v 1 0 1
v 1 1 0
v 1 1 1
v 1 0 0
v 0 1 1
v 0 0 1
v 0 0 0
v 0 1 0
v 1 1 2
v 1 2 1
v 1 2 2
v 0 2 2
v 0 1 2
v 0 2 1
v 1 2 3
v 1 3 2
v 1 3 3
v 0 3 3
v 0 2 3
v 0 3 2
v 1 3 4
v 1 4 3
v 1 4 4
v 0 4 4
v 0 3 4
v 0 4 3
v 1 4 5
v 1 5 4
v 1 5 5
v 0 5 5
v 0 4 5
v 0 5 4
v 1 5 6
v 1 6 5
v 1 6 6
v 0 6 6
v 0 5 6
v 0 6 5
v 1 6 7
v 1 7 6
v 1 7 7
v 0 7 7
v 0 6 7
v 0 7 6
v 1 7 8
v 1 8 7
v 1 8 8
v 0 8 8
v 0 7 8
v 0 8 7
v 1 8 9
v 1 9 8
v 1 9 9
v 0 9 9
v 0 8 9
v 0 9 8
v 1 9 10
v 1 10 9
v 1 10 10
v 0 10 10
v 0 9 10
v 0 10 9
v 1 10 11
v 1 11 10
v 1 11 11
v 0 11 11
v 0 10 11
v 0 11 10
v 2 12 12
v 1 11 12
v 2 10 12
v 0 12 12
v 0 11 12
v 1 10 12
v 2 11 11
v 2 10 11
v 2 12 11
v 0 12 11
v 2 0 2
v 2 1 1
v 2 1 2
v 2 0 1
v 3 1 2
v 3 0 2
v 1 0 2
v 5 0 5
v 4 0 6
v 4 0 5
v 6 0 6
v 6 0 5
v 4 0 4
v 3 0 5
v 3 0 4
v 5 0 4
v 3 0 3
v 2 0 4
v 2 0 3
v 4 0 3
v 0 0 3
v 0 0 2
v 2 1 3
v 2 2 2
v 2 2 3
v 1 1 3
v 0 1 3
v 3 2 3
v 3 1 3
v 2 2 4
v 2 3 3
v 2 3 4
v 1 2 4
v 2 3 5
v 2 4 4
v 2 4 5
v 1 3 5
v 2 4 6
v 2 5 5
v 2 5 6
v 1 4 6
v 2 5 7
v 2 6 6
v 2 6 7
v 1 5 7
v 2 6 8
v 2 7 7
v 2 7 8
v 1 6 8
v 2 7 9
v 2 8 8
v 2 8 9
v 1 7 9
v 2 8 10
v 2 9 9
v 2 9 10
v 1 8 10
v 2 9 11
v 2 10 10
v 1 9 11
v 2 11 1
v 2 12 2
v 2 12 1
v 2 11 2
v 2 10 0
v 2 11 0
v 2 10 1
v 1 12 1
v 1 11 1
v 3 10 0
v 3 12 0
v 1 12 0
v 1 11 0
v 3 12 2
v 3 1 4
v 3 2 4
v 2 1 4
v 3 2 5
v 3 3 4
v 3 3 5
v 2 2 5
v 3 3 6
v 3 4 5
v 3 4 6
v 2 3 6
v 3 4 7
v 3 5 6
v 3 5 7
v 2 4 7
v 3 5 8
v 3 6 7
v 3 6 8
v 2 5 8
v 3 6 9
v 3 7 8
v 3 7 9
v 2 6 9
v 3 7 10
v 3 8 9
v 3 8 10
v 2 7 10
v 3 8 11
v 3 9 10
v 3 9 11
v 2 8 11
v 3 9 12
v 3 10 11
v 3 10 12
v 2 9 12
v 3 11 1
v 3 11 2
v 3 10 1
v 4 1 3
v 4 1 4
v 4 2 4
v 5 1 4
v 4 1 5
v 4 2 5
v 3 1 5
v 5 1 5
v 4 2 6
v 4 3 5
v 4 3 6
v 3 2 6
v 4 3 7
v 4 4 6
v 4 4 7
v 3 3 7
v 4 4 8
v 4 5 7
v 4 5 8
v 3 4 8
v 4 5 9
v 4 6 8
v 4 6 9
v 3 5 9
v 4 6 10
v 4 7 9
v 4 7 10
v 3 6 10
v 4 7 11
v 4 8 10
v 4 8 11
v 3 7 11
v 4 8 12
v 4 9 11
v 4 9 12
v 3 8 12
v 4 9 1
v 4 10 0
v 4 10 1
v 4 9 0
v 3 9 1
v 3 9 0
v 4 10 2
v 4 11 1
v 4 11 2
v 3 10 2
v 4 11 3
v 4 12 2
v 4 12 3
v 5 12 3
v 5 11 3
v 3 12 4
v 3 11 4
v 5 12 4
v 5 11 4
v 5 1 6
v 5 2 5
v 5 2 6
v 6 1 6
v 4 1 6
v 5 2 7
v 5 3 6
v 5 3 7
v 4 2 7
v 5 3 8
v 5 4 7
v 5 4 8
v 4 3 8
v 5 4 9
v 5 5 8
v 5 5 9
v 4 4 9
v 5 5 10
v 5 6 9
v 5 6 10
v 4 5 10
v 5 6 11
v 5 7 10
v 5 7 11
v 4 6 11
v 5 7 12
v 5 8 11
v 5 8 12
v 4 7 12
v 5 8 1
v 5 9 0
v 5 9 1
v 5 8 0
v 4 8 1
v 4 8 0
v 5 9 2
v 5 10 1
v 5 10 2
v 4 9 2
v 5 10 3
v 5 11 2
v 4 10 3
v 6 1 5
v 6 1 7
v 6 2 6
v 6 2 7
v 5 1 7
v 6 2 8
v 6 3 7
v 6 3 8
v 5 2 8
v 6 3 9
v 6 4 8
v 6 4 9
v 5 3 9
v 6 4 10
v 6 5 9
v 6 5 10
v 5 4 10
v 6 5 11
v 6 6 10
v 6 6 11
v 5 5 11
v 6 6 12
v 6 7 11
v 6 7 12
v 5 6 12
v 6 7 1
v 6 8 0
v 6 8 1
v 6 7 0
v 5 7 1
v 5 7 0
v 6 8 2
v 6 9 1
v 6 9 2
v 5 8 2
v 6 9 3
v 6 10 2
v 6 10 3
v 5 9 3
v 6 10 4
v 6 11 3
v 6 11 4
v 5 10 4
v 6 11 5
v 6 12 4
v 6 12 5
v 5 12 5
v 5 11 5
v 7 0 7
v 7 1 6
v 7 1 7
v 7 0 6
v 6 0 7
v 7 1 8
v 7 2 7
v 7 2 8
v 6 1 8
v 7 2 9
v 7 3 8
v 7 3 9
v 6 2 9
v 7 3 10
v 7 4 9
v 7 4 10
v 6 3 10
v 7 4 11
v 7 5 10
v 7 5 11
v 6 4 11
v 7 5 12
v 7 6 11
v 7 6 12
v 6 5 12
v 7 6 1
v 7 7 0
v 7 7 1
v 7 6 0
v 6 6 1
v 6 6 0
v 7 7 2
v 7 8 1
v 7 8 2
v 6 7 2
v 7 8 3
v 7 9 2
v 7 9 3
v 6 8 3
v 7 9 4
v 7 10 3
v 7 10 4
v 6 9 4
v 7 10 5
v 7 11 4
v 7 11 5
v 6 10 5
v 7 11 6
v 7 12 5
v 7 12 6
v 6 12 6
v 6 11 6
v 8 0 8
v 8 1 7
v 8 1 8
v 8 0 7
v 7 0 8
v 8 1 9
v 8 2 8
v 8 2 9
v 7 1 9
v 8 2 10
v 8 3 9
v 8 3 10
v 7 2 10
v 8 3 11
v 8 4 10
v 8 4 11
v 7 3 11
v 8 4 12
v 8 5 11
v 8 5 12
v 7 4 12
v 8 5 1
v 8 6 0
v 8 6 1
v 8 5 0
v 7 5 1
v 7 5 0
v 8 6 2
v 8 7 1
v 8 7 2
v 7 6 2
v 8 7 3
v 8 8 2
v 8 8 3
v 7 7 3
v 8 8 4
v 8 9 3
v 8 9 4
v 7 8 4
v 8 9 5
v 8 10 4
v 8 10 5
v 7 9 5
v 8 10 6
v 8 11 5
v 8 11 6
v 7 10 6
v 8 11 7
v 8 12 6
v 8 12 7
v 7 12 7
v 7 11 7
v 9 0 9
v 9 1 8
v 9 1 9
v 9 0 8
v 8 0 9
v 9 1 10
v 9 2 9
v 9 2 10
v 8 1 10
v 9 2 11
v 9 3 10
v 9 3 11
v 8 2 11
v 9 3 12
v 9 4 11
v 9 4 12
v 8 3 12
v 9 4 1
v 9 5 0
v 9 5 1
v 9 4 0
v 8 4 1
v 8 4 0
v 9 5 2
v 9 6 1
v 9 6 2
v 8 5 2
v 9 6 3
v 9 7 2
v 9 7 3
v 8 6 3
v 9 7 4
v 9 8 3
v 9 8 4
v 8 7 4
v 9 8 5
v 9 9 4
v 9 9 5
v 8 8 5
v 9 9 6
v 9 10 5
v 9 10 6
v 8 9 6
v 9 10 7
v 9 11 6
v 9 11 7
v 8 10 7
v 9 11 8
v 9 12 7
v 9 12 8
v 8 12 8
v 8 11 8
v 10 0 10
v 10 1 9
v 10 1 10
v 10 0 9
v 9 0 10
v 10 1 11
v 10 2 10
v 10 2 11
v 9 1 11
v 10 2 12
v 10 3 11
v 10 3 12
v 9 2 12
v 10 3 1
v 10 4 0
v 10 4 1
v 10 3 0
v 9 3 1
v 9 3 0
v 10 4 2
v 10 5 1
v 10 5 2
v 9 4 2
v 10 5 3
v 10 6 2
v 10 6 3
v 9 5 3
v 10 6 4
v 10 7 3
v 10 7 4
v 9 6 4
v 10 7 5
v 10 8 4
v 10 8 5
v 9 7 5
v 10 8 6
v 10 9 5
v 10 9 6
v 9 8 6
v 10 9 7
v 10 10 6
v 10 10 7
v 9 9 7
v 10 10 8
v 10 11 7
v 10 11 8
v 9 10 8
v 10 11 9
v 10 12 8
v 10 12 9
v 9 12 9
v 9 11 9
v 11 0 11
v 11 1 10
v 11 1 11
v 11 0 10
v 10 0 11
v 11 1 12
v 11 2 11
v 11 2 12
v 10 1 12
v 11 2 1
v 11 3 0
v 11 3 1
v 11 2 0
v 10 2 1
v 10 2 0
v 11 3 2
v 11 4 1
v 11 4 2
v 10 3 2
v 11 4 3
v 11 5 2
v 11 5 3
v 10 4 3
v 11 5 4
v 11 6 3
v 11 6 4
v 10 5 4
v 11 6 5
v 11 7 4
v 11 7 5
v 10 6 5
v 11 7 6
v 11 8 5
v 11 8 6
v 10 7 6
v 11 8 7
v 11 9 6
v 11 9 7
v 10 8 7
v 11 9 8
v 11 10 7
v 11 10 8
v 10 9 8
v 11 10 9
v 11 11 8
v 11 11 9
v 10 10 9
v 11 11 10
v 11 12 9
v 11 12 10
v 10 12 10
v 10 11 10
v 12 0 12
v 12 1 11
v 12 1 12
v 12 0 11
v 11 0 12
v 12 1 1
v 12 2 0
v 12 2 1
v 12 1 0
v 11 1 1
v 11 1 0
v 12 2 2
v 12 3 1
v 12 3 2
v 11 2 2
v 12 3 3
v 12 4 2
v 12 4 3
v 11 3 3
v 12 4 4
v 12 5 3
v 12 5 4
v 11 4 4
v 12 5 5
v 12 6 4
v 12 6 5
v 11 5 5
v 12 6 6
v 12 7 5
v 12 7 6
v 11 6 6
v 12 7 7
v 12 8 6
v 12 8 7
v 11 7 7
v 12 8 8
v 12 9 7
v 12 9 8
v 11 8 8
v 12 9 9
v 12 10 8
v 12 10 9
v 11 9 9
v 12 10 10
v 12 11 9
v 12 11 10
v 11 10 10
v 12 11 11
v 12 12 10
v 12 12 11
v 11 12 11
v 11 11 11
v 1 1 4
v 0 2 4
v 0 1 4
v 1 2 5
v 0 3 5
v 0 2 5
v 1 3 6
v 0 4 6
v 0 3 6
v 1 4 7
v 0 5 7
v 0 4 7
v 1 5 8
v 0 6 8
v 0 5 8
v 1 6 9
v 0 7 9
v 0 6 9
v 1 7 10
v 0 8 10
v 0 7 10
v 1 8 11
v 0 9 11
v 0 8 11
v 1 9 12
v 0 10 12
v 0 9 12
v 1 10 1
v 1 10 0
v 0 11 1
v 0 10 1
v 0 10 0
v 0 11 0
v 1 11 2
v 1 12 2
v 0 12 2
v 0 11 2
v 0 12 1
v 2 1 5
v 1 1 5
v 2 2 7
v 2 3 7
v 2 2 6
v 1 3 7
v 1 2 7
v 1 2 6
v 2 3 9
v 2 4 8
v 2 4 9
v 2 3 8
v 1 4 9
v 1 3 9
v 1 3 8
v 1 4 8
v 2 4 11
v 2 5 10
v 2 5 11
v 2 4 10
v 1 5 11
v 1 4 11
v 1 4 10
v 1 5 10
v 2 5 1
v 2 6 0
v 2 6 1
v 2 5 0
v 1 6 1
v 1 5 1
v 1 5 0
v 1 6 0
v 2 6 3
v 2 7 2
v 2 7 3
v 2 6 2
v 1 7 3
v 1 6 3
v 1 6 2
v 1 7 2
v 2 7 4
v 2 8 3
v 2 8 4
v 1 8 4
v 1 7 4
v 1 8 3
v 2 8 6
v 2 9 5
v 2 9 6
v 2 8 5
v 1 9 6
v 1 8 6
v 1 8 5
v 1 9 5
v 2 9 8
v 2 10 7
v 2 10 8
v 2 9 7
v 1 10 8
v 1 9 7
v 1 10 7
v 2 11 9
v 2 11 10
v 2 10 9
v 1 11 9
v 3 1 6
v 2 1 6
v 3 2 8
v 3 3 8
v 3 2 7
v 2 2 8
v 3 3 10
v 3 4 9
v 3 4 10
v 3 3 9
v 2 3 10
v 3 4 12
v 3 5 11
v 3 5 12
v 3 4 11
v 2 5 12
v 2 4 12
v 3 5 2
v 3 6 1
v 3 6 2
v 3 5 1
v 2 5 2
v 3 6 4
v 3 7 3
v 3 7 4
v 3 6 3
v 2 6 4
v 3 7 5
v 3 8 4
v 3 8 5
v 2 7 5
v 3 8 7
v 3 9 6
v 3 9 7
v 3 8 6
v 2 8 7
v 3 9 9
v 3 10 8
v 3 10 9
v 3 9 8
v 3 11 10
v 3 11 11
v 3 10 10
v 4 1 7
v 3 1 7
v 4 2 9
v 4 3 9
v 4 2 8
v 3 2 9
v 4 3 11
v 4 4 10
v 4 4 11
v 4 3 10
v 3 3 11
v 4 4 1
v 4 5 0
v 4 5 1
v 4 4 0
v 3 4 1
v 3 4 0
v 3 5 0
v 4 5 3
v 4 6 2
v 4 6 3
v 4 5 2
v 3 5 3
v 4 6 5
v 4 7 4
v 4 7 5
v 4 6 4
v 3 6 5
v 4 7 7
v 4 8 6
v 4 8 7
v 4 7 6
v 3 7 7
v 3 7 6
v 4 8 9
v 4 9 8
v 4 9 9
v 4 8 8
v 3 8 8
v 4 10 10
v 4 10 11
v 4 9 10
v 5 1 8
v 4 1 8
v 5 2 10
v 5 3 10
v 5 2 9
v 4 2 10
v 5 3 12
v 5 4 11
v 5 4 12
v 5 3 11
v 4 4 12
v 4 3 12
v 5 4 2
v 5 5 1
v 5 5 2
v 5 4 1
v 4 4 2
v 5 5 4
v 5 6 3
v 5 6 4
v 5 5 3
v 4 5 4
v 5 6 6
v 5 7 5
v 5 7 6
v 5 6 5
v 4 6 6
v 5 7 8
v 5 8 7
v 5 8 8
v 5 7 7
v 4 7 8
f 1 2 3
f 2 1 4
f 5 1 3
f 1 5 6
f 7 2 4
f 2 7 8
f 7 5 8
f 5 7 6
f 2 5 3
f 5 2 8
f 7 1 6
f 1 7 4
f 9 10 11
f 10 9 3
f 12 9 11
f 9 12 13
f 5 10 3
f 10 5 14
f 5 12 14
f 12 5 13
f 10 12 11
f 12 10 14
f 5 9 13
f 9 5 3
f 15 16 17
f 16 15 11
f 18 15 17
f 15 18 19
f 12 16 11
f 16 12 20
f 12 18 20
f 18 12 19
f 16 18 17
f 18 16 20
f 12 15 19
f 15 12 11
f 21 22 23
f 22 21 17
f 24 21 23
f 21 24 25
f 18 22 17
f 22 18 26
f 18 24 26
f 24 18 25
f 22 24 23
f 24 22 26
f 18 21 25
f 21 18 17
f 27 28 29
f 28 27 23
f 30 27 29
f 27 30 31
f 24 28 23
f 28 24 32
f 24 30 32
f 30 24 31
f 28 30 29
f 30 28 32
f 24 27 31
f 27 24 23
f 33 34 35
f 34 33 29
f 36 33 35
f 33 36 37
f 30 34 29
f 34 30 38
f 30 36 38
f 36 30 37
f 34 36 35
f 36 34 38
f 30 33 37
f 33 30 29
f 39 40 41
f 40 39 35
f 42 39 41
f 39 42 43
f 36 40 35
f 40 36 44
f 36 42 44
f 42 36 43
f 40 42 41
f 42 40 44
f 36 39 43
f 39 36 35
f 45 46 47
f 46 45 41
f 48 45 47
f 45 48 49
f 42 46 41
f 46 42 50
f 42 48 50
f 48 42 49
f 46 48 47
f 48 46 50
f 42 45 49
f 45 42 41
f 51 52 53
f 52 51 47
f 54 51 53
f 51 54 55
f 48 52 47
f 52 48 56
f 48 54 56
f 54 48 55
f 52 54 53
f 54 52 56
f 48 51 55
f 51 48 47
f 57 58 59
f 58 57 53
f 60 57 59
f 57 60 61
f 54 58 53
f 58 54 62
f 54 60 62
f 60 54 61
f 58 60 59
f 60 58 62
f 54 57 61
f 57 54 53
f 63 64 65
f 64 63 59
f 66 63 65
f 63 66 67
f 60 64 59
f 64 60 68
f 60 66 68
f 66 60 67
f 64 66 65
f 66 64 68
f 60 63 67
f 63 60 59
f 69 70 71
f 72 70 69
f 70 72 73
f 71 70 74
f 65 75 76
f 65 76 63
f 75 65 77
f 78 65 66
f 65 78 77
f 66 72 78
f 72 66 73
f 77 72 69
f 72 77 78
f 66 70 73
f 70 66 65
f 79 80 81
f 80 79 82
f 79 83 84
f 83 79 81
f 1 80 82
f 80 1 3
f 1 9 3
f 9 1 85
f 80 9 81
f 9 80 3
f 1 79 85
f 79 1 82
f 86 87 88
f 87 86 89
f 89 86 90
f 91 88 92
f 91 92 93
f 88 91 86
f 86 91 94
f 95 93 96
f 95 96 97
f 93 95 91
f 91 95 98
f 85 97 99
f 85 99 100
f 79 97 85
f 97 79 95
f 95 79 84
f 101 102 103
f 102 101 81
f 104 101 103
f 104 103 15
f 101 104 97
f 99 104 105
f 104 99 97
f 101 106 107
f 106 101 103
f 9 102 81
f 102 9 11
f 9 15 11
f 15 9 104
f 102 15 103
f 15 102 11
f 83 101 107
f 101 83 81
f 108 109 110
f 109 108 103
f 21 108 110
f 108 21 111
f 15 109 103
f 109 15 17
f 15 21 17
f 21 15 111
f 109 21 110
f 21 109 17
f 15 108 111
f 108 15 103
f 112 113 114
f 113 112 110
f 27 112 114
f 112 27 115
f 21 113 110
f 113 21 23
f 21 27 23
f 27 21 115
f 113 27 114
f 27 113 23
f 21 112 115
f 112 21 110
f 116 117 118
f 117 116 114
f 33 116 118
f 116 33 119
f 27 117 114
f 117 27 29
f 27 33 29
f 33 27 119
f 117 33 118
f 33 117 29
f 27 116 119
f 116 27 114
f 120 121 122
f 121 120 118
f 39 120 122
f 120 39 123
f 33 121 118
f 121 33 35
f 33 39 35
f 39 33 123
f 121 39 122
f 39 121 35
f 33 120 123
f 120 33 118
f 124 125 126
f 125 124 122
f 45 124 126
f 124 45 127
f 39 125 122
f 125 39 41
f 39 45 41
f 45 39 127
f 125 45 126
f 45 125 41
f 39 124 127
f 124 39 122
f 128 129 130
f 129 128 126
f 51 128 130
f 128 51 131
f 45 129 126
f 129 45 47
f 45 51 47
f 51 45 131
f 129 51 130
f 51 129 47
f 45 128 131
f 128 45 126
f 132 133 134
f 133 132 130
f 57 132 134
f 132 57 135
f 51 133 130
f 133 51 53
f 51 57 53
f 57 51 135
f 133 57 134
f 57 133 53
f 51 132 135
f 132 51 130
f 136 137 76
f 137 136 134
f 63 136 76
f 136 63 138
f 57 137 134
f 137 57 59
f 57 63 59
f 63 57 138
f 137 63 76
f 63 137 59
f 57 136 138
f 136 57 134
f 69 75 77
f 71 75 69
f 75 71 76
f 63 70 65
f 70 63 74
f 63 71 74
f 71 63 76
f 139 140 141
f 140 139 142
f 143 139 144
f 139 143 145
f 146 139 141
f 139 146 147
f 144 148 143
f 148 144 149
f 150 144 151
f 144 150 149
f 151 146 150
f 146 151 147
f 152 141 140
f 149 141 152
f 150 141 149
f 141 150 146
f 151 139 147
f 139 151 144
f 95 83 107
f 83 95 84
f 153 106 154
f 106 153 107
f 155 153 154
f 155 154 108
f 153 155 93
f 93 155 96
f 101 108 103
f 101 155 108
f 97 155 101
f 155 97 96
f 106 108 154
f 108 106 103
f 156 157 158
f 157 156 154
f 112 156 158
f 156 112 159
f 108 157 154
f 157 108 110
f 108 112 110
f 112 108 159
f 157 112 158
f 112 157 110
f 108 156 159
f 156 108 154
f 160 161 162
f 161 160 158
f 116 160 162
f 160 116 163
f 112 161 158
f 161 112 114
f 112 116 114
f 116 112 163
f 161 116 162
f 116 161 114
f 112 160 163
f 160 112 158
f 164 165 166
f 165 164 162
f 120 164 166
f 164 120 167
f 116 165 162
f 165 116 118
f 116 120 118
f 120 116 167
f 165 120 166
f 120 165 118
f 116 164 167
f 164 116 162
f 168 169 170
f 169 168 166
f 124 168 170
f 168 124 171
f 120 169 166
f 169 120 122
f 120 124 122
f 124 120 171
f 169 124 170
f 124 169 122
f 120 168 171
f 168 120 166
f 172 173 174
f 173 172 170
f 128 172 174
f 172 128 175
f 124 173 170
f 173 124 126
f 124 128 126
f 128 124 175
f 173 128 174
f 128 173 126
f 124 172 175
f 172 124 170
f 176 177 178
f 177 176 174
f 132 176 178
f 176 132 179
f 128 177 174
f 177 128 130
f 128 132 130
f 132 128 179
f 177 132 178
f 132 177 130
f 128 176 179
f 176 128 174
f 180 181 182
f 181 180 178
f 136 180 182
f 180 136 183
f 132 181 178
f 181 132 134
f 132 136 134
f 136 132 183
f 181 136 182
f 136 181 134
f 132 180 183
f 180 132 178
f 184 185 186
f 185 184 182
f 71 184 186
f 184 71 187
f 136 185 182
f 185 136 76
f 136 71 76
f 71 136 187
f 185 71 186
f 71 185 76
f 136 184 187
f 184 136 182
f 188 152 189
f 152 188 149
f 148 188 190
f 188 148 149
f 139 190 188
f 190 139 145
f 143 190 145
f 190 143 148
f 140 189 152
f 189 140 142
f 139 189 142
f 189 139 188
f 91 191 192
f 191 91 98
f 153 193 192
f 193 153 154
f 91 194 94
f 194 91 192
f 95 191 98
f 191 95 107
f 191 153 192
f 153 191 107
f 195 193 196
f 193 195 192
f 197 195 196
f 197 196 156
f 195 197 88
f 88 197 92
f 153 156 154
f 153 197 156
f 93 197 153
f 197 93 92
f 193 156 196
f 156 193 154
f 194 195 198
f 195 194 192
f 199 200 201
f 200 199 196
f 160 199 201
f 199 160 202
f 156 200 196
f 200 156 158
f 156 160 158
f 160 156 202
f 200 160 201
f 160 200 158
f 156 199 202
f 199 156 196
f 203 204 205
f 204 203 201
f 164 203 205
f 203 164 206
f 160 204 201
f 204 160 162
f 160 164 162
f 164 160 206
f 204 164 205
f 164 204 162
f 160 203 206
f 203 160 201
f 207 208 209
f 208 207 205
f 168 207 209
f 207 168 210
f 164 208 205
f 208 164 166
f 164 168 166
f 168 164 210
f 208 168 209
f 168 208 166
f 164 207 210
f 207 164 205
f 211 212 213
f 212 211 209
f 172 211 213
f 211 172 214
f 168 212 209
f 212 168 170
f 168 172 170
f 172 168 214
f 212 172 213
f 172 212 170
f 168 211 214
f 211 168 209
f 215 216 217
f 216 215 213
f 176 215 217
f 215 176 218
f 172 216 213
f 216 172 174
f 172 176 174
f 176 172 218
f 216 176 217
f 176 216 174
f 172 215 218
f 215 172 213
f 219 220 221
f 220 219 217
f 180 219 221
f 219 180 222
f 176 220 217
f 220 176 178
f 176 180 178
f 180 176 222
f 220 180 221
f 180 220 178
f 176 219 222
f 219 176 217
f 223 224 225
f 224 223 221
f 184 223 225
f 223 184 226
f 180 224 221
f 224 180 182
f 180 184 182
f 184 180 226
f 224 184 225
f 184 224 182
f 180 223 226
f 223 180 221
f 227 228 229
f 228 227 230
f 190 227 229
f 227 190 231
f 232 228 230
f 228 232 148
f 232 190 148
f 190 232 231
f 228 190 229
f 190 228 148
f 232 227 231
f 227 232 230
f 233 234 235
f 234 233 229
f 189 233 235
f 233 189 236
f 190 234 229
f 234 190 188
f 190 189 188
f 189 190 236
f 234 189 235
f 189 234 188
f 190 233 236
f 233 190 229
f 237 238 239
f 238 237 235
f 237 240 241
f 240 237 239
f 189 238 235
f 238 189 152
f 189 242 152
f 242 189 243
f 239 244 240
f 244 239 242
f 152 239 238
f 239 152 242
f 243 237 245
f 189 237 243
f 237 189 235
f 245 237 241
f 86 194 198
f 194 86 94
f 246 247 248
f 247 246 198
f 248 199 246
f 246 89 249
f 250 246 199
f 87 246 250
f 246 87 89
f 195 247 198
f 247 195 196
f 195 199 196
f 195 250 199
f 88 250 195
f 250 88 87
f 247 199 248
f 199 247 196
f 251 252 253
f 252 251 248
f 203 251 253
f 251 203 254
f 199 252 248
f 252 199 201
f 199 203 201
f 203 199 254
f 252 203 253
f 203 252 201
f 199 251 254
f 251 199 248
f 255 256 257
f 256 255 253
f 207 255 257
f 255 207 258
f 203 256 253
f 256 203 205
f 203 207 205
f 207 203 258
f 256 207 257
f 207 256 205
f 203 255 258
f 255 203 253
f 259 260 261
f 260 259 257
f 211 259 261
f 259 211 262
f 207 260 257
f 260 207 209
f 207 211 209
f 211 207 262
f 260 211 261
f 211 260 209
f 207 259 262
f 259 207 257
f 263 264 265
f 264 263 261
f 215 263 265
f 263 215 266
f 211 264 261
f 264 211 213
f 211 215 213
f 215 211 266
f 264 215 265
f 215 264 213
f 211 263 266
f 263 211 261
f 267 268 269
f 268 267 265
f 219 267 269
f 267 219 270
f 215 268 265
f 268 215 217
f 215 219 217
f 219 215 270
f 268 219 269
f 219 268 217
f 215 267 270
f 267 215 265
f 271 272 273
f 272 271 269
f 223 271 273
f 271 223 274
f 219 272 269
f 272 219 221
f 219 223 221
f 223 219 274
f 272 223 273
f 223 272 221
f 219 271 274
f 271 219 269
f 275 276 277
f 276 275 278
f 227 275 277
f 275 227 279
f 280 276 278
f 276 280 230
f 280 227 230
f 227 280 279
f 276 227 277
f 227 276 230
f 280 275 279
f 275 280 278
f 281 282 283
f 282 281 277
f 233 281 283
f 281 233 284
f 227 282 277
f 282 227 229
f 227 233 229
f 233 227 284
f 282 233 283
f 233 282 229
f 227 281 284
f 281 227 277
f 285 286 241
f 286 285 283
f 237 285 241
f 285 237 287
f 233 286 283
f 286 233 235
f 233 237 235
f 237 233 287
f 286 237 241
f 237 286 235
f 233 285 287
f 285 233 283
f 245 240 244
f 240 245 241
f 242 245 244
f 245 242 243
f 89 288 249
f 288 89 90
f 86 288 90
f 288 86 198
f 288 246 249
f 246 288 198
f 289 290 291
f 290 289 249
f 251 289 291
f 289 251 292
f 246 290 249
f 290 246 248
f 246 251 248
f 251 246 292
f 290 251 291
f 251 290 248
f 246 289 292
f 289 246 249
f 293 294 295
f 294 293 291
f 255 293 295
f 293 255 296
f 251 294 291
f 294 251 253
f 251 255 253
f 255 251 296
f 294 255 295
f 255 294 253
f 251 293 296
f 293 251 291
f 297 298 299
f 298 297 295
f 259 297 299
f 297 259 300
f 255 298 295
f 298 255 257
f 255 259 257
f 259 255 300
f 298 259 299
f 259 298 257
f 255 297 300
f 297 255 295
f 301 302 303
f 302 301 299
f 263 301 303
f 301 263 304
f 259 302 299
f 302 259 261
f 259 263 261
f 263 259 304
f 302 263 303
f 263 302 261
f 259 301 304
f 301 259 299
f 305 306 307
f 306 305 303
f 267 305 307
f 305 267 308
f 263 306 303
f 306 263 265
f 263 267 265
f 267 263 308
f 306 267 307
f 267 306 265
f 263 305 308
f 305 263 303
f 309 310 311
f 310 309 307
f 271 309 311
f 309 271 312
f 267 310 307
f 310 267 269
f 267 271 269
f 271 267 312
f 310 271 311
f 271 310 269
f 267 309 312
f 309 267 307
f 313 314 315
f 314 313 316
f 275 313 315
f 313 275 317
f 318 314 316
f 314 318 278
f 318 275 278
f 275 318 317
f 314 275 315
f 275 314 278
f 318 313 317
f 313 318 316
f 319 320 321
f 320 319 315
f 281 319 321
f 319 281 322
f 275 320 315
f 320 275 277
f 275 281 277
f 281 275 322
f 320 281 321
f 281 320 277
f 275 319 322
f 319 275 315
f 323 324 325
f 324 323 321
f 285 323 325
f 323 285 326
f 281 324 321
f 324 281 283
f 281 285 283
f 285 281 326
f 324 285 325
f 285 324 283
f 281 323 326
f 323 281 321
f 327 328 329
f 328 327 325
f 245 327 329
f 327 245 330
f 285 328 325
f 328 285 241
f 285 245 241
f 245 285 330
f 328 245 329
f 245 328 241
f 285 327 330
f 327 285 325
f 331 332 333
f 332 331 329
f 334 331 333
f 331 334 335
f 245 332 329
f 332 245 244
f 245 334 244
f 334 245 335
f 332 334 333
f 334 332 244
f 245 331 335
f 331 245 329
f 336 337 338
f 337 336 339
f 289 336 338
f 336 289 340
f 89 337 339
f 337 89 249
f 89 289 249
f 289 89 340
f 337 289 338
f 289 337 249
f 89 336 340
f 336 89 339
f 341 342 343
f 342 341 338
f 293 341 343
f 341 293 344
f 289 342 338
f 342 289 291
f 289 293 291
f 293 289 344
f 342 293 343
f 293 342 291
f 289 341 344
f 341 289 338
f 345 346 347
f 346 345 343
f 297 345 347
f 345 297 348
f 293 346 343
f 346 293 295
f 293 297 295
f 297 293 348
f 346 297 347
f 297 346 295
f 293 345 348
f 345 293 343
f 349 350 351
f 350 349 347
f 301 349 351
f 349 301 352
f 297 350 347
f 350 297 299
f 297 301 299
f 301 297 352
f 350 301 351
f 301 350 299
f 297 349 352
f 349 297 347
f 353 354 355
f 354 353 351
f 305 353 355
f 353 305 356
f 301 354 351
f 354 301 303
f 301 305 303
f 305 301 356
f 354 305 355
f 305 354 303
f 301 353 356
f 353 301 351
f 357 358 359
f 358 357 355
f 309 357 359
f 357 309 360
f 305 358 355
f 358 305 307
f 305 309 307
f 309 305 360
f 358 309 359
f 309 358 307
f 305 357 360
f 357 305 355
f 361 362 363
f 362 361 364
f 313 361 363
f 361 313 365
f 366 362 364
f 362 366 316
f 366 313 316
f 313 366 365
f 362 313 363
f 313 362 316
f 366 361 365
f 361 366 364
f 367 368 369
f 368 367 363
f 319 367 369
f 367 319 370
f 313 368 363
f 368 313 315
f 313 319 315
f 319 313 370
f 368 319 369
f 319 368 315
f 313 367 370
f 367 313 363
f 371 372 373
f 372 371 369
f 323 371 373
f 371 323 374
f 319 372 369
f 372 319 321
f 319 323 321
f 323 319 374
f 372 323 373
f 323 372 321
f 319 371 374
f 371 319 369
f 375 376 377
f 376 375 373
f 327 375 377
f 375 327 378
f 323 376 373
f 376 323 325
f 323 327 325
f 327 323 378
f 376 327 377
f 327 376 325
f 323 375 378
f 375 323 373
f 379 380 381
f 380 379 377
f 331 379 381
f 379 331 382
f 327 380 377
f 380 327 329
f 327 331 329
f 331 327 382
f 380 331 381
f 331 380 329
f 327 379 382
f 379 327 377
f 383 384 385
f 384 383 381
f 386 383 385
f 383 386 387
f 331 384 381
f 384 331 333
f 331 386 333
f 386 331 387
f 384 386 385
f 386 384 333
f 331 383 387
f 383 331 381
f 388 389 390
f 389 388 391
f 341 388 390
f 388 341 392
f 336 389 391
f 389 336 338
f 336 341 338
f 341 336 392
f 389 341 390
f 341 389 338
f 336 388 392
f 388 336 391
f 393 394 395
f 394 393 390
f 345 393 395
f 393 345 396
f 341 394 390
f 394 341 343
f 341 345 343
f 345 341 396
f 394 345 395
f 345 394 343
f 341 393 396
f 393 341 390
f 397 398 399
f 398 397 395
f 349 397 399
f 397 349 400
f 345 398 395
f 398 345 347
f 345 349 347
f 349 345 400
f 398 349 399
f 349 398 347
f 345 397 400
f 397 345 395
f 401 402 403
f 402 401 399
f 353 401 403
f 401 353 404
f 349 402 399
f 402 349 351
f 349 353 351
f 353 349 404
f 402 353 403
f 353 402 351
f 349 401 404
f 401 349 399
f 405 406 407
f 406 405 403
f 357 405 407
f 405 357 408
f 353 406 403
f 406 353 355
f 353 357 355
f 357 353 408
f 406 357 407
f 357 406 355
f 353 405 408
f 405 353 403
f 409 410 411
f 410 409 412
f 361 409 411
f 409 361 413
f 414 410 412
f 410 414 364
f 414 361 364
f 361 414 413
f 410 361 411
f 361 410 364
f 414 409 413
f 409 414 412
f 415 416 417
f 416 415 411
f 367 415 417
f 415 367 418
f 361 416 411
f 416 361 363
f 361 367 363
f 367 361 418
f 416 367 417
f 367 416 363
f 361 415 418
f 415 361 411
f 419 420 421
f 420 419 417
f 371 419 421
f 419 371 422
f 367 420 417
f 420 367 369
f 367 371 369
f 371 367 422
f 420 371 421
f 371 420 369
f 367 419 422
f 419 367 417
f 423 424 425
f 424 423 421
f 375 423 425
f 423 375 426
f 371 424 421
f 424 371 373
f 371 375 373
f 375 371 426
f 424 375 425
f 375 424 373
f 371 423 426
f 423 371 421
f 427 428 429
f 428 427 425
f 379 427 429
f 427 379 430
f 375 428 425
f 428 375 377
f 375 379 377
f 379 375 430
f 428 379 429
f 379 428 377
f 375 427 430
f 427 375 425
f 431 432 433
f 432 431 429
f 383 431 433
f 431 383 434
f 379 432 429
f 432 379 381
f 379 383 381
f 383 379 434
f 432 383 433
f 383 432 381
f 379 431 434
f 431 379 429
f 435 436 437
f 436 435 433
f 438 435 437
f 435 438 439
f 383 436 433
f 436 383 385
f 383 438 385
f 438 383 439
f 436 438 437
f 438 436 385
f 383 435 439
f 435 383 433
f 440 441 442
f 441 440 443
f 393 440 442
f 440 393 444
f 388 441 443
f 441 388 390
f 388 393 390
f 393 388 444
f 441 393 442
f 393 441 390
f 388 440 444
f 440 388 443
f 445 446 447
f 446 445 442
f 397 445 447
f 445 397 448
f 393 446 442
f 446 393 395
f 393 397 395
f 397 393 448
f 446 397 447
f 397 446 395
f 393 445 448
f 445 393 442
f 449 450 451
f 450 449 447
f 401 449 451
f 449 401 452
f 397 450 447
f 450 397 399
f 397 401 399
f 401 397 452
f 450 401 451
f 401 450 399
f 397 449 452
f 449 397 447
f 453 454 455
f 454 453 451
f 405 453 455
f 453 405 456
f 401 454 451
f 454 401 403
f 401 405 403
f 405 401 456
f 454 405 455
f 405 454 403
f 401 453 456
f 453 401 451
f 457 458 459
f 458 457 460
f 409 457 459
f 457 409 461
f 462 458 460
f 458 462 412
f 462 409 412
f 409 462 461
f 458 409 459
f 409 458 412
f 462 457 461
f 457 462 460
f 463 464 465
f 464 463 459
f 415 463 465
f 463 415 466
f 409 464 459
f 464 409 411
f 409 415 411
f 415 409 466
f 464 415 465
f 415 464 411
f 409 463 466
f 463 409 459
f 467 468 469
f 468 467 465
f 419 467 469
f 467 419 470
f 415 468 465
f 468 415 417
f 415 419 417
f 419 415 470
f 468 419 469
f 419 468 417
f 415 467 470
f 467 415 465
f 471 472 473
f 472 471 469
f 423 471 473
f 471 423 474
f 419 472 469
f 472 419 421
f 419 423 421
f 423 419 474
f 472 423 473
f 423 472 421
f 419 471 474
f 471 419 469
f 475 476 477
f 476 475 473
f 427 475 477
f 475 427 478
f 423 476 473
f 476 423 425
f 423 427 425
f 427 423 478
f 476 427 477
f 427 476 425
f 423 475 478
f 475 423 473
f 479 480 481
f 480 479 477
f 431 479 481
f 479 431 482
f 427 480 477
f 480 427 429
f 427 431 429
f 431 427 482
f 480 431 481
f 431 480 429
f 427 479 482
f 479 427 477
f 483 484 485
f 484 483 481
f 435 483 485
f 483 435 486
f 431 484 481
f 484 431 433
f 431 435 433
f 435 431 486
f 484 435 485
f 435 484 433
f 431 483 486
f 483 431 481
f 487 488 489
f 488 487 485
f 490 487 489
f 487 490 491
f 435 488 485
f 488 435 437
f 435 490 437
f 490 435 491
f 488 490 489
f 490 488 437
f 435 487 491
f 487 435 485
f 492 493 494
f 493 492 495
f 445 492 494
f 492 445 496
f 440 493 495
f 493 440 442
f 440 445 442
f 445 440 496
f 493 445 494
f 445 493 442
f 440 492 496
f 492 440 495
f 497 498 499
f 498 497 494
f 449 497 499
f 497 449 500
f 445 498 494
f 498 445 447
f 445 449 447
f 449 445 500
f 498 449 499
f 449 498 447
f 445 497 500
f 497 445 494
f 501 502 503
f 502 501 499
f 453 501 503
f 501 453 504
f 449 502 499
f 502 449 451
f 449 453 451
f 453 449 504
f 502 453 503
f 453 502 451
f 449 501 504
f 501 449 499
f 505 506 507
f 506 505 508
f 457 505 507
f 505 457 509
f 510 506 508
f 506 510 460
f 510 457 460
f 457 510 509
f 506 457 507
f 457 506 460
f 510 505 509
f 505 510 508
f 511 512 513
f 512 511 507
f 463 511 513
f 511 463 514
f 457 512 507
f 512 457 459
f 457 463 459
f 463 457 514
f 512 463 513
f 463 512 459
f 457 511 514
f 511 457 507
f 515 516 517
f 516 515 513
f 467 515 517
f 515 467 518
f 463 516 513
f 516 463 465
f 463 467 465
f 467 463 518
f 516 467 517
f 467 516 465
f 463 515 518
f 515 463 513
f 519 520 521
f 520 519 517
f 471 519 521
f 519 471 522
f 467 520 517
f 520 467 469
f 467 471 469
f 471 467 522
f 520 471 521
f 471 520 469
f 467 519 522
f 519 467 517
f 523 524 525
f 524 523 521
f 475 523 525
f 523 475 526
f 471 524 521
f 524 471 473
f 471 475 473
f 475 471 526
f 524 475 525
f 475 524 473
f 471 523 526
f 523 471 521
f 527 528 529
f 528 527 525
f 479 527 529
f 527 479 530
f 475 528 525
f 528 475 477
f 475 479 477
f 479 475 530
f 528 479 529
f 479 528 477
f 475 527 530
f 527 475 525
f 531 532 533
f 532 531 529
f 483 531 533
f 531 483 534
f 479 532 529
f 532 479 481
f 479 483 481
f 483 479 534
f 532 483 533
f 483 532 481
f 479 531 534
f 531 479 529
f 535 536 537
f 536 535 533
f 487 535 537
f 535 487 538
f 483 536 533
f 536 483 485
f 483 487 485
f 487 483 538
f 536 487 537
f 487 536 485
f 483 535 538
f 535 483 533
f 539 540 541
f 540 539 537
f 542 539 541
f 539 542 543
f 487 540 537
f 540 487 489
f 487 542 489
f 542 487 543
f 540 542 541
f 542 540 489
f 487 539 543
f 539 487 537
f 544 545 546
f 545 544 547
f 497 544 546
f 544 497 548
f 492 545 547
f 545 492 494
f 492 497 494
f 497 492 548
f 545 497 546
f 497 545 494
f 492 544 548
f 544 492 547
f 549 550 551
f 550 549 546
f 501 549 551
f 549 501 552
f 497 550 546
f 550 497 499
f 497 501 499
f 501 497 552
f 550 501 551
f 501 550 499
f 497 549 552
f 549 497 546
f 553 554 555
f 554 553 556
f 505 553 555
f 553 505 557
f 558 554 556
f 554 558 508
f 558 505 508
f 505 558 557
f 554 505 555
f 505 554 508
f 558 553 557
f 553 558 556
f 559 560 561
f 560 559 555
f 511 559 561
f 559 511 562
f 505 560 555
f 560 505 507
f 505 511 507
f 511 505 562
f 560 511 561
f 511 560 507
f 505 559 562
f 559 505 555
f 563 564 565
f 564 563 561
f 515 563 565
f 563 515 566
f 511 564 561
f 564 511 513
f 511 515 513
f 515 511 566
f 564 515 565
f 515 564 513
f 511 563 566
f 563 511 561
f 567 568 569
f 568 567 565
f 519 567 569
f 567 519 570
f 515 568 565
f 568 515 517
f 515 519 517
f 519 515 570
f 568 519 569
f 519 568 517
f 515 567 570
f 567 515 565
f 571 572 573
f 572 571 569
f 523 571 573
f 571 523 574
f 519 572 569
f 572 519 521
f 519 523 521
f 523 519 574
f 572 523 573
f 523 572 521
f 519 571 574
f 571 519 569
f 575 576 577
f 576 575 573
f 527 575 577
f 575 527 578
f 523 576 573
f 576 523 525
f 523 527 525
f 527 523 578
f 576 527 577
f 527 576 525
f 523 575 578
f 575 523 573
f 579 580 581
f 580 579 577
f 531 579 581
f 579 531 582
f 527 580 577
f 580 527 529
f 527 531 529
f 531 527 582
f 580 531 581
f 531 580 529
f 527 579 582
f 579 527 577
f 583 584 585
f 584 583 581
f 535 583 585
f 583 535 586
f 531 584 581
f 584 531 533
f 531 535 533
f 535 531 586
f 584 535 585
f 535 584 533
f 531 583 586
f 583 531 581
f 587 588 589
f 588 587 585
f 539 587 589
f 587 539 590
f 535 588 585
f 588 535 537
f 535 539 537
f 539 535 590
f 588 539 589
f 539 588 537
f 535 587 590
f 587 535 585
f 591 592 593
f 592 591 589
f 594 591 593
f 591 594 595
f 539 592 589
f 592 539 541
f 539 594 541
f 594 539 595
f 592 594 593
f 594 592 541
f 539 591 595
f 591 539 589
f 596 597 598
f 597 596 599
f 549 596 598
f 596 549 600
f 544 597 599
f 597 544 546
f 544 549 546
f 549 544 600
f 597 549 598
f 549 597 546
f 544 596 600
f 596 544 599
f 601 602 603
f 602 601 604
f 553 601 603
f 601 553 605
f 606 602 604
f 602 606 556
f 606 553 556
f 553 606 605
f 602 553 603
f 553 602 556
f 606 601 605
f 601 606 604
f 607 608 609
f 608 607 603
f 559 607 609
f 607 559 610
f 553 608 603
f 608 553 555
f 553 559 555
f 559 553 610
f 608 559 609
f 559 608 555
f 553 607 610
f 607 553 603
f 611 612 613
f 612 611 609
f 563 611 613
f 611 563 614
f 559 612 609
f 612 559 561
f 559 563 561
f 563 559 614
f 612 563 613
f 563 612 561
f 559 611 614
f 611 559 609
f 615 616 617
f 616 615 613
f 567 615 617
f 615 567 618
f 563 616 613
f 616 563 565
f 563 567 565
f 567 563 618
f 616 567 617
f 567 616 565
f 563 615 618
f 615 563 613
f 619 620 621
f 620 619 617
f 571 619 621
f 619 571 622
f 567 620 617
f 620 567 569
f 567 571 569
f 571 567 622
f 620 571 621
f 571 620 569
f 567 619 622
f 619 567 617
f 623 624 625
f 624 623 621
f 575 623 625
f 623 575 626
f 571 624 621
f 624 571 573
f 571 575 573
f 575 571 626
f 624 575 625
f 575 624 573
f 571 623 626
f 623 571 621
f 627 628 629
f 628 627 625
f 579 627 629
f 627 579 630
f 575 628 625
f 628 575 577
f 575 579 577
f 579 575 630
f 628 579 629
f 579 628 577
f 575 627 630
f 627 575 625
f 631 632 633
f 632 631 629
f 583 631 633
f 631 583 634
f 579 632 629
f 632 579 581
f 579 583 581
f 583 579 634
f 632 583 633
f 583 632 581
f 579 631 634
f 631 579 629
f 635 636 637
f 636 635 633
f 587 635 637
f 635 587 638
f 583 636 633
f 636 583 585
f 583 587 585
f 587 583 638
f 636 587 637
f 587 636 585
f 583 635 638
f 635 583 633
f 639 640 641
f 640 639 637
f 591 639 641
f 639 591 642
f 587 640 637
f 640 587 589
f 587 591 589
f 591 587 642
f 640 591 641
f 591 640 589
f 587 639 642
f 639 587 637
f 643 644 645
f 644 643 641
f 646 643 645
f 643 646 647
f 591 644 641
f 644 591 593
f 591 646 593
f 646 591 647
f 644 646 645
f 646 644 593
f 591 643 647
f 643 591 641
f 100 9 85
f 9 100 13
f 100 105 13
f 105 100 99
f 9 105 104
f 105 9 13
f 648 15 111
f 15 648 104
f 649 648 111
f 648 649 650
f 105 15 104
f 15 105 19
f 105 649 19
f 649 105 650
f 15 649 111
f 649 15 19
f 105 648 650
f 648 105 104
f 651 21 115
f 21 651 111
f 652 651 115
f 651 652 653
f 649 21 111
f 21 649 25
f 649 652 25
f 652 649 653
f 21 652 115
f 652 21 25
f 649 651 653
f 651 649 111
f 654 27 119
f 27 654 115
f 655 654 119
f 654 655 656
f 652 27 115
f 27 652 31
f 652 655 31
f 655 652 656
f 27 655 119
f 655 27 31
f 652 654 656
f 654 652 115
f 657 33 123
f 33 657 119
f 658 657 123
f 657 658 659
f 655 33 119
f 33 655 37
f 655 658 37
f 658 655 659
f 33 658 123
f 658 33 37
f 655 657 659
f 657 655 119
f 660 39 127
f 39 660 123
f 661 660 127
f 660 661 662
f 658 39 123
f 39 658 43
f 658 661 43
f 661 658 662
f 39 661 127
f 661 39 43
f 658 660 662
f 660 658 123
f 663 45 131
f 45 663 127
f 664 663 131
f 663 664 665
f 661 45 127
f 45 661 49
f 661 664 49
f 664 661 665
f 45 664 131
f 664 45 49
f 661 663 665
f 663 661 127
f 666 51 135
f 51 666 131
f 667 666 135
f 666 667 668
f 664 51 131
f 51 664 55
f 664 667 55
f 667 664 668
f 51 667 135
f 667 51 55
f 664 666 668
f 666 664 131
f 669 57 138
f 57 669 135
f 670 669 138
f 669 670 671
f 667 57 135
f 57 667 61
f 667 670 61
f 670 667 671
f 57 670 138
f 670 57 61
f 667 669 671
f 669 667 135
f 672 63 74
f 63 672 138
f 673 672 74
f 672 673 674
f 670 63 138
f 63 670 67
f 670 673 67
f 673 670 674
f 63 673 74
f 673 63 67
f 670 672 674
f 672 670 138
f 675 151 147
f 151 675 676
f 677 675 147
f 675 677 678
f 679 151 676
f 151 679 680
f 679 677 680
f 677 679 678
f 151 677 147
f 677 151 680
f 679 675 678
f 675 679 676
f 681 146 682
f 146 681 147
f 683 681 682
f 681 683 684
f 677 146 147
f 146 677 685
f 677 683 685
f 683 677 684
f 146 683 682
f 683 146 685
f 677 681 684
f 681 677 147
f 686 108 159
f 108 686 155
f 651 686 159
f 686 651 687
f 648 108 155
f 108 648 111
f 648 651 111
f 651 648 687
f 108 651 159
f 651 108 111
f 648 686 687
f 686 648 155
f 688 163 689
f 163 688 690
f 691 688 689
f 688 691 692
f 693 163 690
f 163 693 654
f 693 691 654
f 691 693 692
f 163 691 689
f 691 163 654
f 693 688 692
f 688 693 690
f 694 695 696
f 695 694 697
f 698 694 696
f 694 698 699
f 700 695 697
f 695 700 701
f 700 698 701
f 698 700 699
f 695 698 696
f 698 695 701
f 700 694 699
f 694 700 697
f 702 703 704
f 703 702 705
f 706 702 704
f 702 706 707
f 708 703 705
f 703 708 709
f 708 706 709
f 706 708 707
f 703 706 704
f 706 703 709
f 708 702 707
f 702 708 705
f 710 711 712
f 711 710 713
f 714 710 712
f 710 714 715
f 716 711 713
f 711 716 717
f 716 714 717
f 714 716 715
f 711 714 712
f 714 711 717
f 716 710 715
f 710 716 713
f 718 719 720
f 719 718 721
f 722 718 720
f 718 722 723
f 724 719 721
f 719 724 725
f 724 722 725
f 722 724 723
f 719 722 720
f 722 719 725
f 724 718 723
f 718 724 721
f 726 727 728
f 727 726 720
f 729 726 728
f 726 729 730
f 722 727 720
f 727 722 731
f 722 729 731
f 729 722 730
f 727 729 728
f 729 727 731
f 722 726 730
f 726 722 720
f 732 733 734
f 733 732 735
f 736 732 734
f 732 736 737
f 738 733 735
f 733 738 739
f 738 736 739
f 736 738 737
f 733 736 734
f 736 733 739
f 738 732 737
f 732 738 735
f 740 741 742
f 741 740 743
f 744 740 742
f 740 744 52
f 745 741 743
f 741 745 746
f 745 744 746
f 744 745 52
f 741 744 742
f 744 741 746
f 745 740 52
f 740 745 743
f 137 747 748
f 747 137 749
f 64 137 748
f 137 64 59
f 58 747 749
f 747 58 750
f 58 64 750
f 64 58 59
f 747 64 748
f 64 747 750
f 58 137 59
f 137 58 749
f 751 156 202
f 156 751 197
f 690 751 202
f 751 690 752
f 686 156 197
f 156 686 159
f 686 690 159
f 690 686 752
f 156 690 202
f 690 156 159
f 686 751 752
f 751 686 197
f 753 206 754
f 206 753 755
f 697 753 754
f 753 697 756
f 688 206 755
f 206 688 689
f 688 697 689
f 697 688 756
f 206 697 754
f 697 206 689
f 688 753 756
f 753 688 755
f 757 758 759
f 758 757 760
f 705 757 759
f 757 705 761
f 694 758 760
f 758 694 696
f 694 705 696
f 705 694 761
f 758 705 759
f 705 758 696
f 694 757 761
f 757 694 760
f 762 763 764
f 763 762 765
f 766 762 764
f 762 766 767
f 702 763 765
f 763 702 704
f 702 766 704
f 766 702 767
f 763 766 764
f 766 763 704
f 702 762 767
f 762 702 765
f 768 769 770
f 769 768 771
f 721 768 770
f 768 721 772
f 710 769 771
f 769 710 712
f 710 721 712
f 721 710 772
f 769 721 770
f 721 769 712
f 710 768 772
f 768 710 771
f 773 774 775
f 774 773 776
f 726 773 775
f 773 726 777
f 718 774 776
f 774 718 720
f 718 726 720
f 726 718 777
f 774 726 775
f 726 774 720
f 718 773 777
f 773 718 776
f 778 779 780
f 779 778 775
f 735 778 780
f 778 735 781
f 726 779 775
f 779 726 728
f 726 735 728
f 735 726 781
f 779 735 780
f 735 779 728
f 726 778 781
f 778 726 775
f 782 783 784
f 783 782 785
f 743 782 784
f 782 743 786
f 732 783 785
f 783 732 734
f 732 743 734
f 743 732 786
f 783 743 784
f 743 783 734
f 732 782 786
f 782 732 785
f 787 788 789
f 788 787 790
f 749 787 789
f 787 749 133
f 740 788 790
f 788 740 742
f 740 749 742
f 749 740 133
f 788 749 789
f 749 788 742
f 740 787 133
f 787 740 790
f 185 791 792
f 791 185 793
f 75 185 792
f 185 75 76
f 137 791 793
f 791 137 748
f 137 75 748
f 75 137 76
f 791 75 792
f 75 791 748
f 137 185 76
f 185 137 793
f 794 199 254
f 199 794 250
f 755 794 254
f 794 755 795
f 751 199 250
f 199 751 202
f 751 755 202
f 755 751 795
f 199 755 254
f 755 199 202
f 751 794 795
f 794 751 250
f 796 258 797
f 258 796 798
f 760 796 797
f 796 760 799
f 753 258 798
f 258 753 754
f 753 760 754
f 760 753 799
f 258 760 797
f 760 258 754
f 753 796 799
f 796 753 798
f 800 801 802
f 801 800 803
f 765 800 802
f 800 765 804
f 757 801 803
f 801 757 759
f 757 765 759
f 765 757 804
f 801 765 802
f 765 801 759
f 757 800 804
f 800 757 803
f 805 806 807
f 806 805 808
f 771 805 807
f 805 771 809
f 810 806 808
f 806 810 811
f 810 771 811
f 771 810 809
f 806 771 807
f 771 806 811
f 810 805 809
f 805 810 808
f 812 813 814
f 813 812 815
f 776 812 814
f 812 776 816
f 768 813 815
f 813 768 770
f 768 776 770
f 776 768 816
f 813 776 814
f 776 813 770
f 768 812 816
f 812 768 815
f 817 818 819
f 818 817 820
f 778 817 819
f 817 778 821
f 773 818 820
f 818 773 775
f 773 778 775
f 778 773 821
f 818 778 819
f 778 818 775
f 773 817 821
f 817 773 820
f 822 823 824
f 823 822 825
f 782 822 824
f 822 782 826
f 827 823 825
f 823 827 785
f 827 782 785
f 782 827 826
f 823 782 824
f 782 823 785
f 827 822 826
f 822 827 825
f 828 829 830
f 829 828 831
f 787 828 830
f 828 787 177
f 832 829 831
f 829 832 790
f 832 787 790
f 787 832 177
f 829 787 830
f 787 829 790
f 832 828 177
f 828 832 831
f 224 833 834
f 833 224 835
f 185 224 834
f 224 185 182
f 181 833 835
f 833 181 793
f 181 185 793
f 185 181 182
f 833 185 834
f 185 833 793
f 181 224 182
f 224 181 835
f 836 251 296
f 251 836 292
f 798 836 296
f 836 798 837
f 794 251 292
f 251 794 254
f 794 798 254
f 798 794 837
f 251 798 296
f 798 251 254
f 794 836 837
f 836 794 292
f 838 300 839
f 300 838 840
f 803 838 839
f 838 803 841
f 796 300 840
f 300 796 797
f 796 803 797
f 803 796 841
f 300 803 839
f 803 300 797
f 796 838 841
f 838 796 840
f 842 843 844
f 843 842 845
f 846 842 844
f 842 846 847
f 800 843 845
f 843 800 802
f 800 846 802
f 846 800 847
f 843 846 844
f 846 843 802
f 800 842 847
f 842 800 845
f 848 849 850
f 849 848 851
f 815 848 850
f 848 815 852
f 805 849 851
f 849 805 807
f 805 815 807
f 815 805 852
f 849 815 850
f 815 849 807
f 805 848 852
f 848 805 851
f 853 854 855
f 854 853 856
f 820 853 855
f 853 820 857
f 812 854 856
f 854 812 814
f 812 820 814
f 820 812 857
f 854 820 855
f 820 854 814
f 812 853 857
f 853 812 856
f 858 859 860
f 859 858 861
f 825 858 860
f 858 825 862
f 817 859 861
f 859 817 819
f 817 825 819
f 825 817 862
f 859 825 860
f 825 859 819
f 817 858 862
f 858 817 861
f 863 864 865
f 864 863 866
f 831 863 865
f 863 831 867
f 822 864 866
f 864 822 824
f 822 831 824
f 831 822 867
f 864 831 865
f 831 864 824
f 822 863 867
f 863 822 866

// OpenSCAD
union() {
    translate([0, 0, 0]) cube([1, 1, 1]);
    translate([0, 1, 1]) cube([1, 1, 1]);
    translate([0, 2, 2]) cube([1, 1, 1]);
    translate([0, 3, 3]) cube([1, 1, 1]);
    translate([0, 4, 4]) cube([1, 1, 1]);
    translate([0, 5, 5]) cube([1, 1, 1]);
    translate([0, 6, 6]) cube([1, 1, 1]);
    translate([0, 7, 7]) cube([1, 1, 1]);
    translate([0, 8, 8]) cube([1, 1, 1]);
    translate([0, 9, 9]) cube([1, 1, 1]);
    translate([0, 10, 10]) cube([1, 1, 1]);
    translate([0, 11, 11]) cube([1, 1, 1]);
    translate([1, 0, 1]) cube([1, 1, 1]);
    translate([1, 1, 2]) cube([1, 1, 1]);
    translate([1, 2, 3]) cube([1, 1, 1]);
    translate([1, 3, 4]) cube([1, 1, 1]);
    translate([1, 4, 5]) cube([1, 1, 1]);
    translate([1, 5, 6]) cube([1, 1, 1]);
    translate([1, 6, 7]) cube([1, 1, 1]);
    translate([1, 7, 8]) cube([1, 1, 1]);
    translate([1, 8, 9]) cube([1, 1, 1]);
    translate([1, 9, 10]) cube([1, 1, 1]);
    translate([1, 10, 11]) cube([1, 1, 1]);
    translate([1, 11, 0]) cube([1, 1, 1]);
    translate([2, 0, 2]) cube([1, 1, 1]);
    translate([2, 1, 3]) cube([1, 1, 1]);
    translate([2, 2, 4]) cube([1, 1, 1]);
    translate([2, 3, 5]) cube([1, 1, 1]);
    translate([2, 4, 6]) cube([1, 1, 1]);
    translate([2, 5, 7]) cube([1, 1, 1]);
    translate([2, 6, 8]) cube([1, 1, 1]);
    translate([2, 7, 9]) cube([1, 1, 1]);
    translate([2, 8, 10]) cube([1, 1, 1]);
    translate([2, 9, 11]) cube([1, 1, 1]);
    translate([2, 10, 0]) cube([1, 1, 1]);
    translate([2, 11, 1]) cube([1, 1, 1]);
    translate([3, 0, 3]) cube([1, 1, 1]);
    translate([3, 1, 4]) cube([1, 1, 1]);
    translate([3, 2, 5]) cube([1, 1, 1]);
    translate([3, 3, 6]) cube([1, 1, 1]);
    translate([3, 4, 7]) cube([1, 1, 1]);
    translate([3, 5, 8]) cube([1, 1, 1]);
    translate([3, 6, 9]) cube([1, 1, 1]);
    translate([3, 7, 10]) cube([1, 1, 1]);
    translate([3, 8, 11]) cube([1, 1, 1]);
    translate([3, 9, 0]) cube([1, 1, 1]);
    translate([3, 10, 1]) cube([1, 1, 1]);
    translate([3, 11, 2]) cube([1, 1, 1]);
    translate([4, 0, 4]) cube([1, 1, 1]);
    translate([4, 1, 5]) cube([1, 1, 1]);
    translate([4, 2, 6]) cube([1, 1, 1]);
    translate([4, 3, 7]) cube([1, 1, 1]);
    translate([4, 4, 8]) cube([1, 1, 1]);
    translate([4, 5, 9]) cube([1, 1, 1]);
    translate([4, 6, 10]) cube([1, 1, 1]);
    translate([4, 7, 11]) cube([1, 1, 1]);
    translate([4, 8, 0]) cube([1, 1, 1]);
    translate([4, 9, 1]) cube([1, 1, 1]);
    translate([4, 10, 2]) cube([1, 1, 1]);
    translate([4, 11, 3]) cube([1, 1, 1]);
    translate([5, 0, 5]) cube([1, 1, 1]);
    translate([5, 1, 6]) cube([1, 1, 1]);
    translate([5, 2, 7]) cube([1, 1, 1]);
    translate([5, 3, 8]) cube([1, 1, 1]);
    translate([5, 4, 9]) cube([1, 1, 1]);
    translate([5, 5, 10]) cube([1, 1, 1]);
    translate([5, 6, 11]) cube([1, 1, 1]);
    translate([5, 7, 0]) cube([1, 1, 1]);
    translate([5, 8, 1]) cube([1, 1, 1]);
    translate([5, 9, 2]) cube([1, 1, 1]);
    translate([5, 10, 3]) cube([1, 1, 1]);
    translate([5, 11, 4]) cube([1, 1, 1]);
    translate([6, 0, 6]) cube([1, 1, 1]);
    translate([6, 1, 7]) cube([1, 1, 1]);
    translate([6, 2, 8]) cube([1, 1, 1]);
    translate([6, 3, 9]) cube([1, 1, 1]);
    translate([6, 4, 10]) cube([1, 1, 1]);
    translate([6, 5, 11]) cube([1, 1, 1]);
    translate([6, 6, 0]) cube([1, 1, 1]);
    translate([6, 7, 1]) cube([1, 1, 1]);
    translate([6, 8, 2]) cube([1, 1, 1]);
    translate([6, 9, 3]) cube([1, 1, 1]);
    translate([6, 10, 4]) cube([1, 1, 1]);
    translate([6, 11, 5]) cube([1, 1, 1]);
    translate([7, 0, 7]) cube([1, 1, 1]);
    translate([7, 1, 8]) cube([1, 1, 1]);
    translate([7, 2, 9]) cube([1, 1, 1]);
    translate([7, 3, 10]) cube([1, 1, 1]);
    translate([7, 4, 11]) cube([1, 1, 1]);
    translate([7, 5, 0]) cube([1, 1, 1]);
    translate([7, 6, 1]) cube([1, 1, 1]);
    translate([7, 7, 2]) cube([1, 1, 1]);
    translate([7, 8, 3]) cube([1, 1, 1]);
    translate([7, 9, 4]) cube([1, 1, 1]);
    translate([7, 10, 5]) cube([1, 1, 1]);
    translate([7, 11, 6]) cube([1, 1, 1]);
    translate([8, 0, 8]) cube([1, 1, 1]);
    translate([8, 1, 9]) cube([1, 1, 1]);
    translate([8, 2, 10]) cube([1, 1, 1]);
    translate([8, 3, 11]) cube([1, 1, 1]);
    translate([8, 4, 0]) cube([1, 1, 1]);
    translate([8, 5, 1]) cube([1, 1, 1]);
    translate([8, 6, 2]) cube([1, 1, 1]);
    translate([8, 7, 3]) cube([1, 1, 1]);
    translate([8, 8, 4]) cube([1, 1, 1]);
    translate([8, 9, 5]) cube([1, 1, 1]);
    translate([8, 10, 6]) cube([1, 1, 1]);
    translate([8, 11, 7]) cube([1, 1, 1]);
    translate([9, 0, 9]) cube([1, 1, 1]);
    translate([9, 1, 10]) cube([1, 1, 1]);
    translate([9, 2, 11]) cube([1, 1, 1]);
    translate([9, 3, 0]) cube([1, 1, 1]);
    translate([9, 4, 1]) cube([1, 1, 1]);
    translate([9, 5, 2]) cube([1, 1, 1]);
    translate([9, 6, 3]) cube([1, 1, 1]);
    translate([9, 7, 4]) cube([1, 1, 1]);
    translate([9, 8, 5]) cube([1, 1, 1]);
    translate([9, 9, 6]) cube([1, 1, 1]);
    translate([9, 10, 7]) cube([1, 1, 1]);
    translate([9, 11, 8]) cube([1, 1, 1]);
    translate([10, 0, 10]) cube([1, 1, 1]);
    translate([10, 1, 11]) cube([1, 1, 1]);
    translate([10, 2, 0]) cube([1, 1, 1]);
    translate([10, 3, 1]) cube([1, 1, 1]);
    translate([10, 4, 2]) cube([1, 1, 1]);
    translate([10, 5, 3]) cube([1, 1, 1]);
    translate([10, 6, 4]) cube([1, 1, 1]);
    translate([10, 7, 5]) cube([1, 1, 1]);
    translate([10, 8, 6]) cube([1, 1, 1]);
    translate([10, 9, 7]) cube([1, 1, 1]);
    translate([10, 10, 8]) cube([1, 1, 1]);
    translate([10, 11, 9]) cube([1, 1, 1]);
    translate([11, 0, 11]) cube([1, 1, 1]);
    translate([11, 1, 0]) cube([1, 1, 1]);
    translate([11, 2, 1]) cube([1, 1, 1]);
    translate([11, 3, 2]) cube([1, 1, 1]);
    translate([11, 4, 3]) cube([1, 1, 1]);
    translate([11, 5, 4]) cube([1, 1, 1]);
    translate([11, 6, 5]) cube([1, 1, 1]);
    translate([11, 7, 6]) cube([1, 1, 1]);
    translate([11, 8, 7]) cube([1, 1, 1]);
    translate([11, 9, 8]) cube([1, 1, 1]);
    translate([11, 10, 9]) cube([1, 1, 1]);
    translate([11, 11, 10]) cube([1, 1, 1]);
    translate([0, 0, 2]) cube([1, 1, 1]);
    translate([0, 1, 3]) cube([1, 1, 1]);
    translate([0, 2, 4]) cube([1, 1, 1]);
    translate([0, 3, 5]) cube([1, 1, 1]);
    translate([0, 4, 6]) cube([1, 1, 1]);
    translate([0, 5, 7]) cube([1, 1, 1]);
    translate([0, 6, 8]) cube([1, 1, 1]);
    translate([0, 7, 9]) cube([1, 1, 1]);
    translate([0, 8, 10]) cube([1, 1, 1]);
    translate([0, 9, 11]) cube([1, 1, 1]);
    translate([0, 10, 0]) cube([1, 1, 1]);
    translate([0, 11, 1]) cube([1, 1, 1]);
    translate([1, 0, 2]) cube([1, 1, 1]);
    translate([1, 1, 4]) cube([1, 1, 1]);
    translate([1, 2, 6]) cube([1, 1, 1]);
    translate([1, 3, 8]) cube([1, 1, 1]);
    translate([1, 4, 10]) cube([1, 1, 1]);
    translate([1, 5, 0]) cube([1, 1, 1]);
    translate([1, 6, 2]) cube([1, 1, 1]);
    translate([1, 7, 3]) cube([1, 1, 1]);
    translate([1, 8, 5]) cube([1, 1, 1]);
    translate([1, 9, 7]) cube([1, 1, 1]);
    translate([1, 10, 9]) cube([1, 1, 1]);
    translate([1, 11, 11]) cube([1, 1, 1]);
    translate([2, 0, 3]) cube([1, 1, 1]);
    translate([2, 1, 5]) cube([1, 1, 1]);
    translate([2, 2, 7]) cube([1, 1, 1]);
    translate([2, 3, 9]) cube([1, 1, 1]);
    translate([2, 4, 11]) cube([1, 1, 1]);
    translate([2, 5, 1]) cube([1, 1, 1]);
    translate([2, 6, 3]) cube([1, 1, 1]);
    translate([2, 7, 4]) cube([1, 1, 1]);
    translate([2, 8, 6]) cube([1, 1, 1]);
    translate([2, 9, 8]) cube([1, 1, 1]);
    translate([2, 10, 10]) cube([1, 1, 1]);
    translate([2, 11, 0]) cube([1, 1, 1]);
    translate([3, 0, 4]) cube([1, 1, 1]);
    translate([3, 1, 6]) cube([1, 1, 1]);
    translate([3, 2, 8]) cube([1, 1, 1]);
    translate([3, 3, 10]) cube([1, 1, 1]);
    translate([3, 4, 0]) cube([1, 1, 1]);
    translate([3, 5, 2]) cube([1, 1, 1]);
    translate([3, 6, 4]) cube([1, 1, 1]);
    translate([3, 7, 6]) cube([1, 1, 1]);
    translate([3, 8, 8]) cube([1, 1, 1]);
    translate([3, 9, 10]) cube([1, 1, 1]);
    translate([3, 10, 1]) cube([1, 1, 1]);
    translate([3, 11, 3]) cube([1, 1, 1]);
    translate([4, 0, 5]) cube([1, 1, 1]);
    translate([4, 1, 7]) cube([1, 1, 1]);
    translate([4, 2, 9]) cube([1, 1, 1]);
    translate([4, 3, 11]) cube([1, 1, 1]);
    translate([4, 4, 1]) cube([1, 1, 1]);
    translate([4, 5, 3]) cube([1, 1, 1]);
    translate([4, 6, 5]) cube([1, 1, 1]);
    translate([4, 7, 7]) cube([1, 1, 1]);
}
